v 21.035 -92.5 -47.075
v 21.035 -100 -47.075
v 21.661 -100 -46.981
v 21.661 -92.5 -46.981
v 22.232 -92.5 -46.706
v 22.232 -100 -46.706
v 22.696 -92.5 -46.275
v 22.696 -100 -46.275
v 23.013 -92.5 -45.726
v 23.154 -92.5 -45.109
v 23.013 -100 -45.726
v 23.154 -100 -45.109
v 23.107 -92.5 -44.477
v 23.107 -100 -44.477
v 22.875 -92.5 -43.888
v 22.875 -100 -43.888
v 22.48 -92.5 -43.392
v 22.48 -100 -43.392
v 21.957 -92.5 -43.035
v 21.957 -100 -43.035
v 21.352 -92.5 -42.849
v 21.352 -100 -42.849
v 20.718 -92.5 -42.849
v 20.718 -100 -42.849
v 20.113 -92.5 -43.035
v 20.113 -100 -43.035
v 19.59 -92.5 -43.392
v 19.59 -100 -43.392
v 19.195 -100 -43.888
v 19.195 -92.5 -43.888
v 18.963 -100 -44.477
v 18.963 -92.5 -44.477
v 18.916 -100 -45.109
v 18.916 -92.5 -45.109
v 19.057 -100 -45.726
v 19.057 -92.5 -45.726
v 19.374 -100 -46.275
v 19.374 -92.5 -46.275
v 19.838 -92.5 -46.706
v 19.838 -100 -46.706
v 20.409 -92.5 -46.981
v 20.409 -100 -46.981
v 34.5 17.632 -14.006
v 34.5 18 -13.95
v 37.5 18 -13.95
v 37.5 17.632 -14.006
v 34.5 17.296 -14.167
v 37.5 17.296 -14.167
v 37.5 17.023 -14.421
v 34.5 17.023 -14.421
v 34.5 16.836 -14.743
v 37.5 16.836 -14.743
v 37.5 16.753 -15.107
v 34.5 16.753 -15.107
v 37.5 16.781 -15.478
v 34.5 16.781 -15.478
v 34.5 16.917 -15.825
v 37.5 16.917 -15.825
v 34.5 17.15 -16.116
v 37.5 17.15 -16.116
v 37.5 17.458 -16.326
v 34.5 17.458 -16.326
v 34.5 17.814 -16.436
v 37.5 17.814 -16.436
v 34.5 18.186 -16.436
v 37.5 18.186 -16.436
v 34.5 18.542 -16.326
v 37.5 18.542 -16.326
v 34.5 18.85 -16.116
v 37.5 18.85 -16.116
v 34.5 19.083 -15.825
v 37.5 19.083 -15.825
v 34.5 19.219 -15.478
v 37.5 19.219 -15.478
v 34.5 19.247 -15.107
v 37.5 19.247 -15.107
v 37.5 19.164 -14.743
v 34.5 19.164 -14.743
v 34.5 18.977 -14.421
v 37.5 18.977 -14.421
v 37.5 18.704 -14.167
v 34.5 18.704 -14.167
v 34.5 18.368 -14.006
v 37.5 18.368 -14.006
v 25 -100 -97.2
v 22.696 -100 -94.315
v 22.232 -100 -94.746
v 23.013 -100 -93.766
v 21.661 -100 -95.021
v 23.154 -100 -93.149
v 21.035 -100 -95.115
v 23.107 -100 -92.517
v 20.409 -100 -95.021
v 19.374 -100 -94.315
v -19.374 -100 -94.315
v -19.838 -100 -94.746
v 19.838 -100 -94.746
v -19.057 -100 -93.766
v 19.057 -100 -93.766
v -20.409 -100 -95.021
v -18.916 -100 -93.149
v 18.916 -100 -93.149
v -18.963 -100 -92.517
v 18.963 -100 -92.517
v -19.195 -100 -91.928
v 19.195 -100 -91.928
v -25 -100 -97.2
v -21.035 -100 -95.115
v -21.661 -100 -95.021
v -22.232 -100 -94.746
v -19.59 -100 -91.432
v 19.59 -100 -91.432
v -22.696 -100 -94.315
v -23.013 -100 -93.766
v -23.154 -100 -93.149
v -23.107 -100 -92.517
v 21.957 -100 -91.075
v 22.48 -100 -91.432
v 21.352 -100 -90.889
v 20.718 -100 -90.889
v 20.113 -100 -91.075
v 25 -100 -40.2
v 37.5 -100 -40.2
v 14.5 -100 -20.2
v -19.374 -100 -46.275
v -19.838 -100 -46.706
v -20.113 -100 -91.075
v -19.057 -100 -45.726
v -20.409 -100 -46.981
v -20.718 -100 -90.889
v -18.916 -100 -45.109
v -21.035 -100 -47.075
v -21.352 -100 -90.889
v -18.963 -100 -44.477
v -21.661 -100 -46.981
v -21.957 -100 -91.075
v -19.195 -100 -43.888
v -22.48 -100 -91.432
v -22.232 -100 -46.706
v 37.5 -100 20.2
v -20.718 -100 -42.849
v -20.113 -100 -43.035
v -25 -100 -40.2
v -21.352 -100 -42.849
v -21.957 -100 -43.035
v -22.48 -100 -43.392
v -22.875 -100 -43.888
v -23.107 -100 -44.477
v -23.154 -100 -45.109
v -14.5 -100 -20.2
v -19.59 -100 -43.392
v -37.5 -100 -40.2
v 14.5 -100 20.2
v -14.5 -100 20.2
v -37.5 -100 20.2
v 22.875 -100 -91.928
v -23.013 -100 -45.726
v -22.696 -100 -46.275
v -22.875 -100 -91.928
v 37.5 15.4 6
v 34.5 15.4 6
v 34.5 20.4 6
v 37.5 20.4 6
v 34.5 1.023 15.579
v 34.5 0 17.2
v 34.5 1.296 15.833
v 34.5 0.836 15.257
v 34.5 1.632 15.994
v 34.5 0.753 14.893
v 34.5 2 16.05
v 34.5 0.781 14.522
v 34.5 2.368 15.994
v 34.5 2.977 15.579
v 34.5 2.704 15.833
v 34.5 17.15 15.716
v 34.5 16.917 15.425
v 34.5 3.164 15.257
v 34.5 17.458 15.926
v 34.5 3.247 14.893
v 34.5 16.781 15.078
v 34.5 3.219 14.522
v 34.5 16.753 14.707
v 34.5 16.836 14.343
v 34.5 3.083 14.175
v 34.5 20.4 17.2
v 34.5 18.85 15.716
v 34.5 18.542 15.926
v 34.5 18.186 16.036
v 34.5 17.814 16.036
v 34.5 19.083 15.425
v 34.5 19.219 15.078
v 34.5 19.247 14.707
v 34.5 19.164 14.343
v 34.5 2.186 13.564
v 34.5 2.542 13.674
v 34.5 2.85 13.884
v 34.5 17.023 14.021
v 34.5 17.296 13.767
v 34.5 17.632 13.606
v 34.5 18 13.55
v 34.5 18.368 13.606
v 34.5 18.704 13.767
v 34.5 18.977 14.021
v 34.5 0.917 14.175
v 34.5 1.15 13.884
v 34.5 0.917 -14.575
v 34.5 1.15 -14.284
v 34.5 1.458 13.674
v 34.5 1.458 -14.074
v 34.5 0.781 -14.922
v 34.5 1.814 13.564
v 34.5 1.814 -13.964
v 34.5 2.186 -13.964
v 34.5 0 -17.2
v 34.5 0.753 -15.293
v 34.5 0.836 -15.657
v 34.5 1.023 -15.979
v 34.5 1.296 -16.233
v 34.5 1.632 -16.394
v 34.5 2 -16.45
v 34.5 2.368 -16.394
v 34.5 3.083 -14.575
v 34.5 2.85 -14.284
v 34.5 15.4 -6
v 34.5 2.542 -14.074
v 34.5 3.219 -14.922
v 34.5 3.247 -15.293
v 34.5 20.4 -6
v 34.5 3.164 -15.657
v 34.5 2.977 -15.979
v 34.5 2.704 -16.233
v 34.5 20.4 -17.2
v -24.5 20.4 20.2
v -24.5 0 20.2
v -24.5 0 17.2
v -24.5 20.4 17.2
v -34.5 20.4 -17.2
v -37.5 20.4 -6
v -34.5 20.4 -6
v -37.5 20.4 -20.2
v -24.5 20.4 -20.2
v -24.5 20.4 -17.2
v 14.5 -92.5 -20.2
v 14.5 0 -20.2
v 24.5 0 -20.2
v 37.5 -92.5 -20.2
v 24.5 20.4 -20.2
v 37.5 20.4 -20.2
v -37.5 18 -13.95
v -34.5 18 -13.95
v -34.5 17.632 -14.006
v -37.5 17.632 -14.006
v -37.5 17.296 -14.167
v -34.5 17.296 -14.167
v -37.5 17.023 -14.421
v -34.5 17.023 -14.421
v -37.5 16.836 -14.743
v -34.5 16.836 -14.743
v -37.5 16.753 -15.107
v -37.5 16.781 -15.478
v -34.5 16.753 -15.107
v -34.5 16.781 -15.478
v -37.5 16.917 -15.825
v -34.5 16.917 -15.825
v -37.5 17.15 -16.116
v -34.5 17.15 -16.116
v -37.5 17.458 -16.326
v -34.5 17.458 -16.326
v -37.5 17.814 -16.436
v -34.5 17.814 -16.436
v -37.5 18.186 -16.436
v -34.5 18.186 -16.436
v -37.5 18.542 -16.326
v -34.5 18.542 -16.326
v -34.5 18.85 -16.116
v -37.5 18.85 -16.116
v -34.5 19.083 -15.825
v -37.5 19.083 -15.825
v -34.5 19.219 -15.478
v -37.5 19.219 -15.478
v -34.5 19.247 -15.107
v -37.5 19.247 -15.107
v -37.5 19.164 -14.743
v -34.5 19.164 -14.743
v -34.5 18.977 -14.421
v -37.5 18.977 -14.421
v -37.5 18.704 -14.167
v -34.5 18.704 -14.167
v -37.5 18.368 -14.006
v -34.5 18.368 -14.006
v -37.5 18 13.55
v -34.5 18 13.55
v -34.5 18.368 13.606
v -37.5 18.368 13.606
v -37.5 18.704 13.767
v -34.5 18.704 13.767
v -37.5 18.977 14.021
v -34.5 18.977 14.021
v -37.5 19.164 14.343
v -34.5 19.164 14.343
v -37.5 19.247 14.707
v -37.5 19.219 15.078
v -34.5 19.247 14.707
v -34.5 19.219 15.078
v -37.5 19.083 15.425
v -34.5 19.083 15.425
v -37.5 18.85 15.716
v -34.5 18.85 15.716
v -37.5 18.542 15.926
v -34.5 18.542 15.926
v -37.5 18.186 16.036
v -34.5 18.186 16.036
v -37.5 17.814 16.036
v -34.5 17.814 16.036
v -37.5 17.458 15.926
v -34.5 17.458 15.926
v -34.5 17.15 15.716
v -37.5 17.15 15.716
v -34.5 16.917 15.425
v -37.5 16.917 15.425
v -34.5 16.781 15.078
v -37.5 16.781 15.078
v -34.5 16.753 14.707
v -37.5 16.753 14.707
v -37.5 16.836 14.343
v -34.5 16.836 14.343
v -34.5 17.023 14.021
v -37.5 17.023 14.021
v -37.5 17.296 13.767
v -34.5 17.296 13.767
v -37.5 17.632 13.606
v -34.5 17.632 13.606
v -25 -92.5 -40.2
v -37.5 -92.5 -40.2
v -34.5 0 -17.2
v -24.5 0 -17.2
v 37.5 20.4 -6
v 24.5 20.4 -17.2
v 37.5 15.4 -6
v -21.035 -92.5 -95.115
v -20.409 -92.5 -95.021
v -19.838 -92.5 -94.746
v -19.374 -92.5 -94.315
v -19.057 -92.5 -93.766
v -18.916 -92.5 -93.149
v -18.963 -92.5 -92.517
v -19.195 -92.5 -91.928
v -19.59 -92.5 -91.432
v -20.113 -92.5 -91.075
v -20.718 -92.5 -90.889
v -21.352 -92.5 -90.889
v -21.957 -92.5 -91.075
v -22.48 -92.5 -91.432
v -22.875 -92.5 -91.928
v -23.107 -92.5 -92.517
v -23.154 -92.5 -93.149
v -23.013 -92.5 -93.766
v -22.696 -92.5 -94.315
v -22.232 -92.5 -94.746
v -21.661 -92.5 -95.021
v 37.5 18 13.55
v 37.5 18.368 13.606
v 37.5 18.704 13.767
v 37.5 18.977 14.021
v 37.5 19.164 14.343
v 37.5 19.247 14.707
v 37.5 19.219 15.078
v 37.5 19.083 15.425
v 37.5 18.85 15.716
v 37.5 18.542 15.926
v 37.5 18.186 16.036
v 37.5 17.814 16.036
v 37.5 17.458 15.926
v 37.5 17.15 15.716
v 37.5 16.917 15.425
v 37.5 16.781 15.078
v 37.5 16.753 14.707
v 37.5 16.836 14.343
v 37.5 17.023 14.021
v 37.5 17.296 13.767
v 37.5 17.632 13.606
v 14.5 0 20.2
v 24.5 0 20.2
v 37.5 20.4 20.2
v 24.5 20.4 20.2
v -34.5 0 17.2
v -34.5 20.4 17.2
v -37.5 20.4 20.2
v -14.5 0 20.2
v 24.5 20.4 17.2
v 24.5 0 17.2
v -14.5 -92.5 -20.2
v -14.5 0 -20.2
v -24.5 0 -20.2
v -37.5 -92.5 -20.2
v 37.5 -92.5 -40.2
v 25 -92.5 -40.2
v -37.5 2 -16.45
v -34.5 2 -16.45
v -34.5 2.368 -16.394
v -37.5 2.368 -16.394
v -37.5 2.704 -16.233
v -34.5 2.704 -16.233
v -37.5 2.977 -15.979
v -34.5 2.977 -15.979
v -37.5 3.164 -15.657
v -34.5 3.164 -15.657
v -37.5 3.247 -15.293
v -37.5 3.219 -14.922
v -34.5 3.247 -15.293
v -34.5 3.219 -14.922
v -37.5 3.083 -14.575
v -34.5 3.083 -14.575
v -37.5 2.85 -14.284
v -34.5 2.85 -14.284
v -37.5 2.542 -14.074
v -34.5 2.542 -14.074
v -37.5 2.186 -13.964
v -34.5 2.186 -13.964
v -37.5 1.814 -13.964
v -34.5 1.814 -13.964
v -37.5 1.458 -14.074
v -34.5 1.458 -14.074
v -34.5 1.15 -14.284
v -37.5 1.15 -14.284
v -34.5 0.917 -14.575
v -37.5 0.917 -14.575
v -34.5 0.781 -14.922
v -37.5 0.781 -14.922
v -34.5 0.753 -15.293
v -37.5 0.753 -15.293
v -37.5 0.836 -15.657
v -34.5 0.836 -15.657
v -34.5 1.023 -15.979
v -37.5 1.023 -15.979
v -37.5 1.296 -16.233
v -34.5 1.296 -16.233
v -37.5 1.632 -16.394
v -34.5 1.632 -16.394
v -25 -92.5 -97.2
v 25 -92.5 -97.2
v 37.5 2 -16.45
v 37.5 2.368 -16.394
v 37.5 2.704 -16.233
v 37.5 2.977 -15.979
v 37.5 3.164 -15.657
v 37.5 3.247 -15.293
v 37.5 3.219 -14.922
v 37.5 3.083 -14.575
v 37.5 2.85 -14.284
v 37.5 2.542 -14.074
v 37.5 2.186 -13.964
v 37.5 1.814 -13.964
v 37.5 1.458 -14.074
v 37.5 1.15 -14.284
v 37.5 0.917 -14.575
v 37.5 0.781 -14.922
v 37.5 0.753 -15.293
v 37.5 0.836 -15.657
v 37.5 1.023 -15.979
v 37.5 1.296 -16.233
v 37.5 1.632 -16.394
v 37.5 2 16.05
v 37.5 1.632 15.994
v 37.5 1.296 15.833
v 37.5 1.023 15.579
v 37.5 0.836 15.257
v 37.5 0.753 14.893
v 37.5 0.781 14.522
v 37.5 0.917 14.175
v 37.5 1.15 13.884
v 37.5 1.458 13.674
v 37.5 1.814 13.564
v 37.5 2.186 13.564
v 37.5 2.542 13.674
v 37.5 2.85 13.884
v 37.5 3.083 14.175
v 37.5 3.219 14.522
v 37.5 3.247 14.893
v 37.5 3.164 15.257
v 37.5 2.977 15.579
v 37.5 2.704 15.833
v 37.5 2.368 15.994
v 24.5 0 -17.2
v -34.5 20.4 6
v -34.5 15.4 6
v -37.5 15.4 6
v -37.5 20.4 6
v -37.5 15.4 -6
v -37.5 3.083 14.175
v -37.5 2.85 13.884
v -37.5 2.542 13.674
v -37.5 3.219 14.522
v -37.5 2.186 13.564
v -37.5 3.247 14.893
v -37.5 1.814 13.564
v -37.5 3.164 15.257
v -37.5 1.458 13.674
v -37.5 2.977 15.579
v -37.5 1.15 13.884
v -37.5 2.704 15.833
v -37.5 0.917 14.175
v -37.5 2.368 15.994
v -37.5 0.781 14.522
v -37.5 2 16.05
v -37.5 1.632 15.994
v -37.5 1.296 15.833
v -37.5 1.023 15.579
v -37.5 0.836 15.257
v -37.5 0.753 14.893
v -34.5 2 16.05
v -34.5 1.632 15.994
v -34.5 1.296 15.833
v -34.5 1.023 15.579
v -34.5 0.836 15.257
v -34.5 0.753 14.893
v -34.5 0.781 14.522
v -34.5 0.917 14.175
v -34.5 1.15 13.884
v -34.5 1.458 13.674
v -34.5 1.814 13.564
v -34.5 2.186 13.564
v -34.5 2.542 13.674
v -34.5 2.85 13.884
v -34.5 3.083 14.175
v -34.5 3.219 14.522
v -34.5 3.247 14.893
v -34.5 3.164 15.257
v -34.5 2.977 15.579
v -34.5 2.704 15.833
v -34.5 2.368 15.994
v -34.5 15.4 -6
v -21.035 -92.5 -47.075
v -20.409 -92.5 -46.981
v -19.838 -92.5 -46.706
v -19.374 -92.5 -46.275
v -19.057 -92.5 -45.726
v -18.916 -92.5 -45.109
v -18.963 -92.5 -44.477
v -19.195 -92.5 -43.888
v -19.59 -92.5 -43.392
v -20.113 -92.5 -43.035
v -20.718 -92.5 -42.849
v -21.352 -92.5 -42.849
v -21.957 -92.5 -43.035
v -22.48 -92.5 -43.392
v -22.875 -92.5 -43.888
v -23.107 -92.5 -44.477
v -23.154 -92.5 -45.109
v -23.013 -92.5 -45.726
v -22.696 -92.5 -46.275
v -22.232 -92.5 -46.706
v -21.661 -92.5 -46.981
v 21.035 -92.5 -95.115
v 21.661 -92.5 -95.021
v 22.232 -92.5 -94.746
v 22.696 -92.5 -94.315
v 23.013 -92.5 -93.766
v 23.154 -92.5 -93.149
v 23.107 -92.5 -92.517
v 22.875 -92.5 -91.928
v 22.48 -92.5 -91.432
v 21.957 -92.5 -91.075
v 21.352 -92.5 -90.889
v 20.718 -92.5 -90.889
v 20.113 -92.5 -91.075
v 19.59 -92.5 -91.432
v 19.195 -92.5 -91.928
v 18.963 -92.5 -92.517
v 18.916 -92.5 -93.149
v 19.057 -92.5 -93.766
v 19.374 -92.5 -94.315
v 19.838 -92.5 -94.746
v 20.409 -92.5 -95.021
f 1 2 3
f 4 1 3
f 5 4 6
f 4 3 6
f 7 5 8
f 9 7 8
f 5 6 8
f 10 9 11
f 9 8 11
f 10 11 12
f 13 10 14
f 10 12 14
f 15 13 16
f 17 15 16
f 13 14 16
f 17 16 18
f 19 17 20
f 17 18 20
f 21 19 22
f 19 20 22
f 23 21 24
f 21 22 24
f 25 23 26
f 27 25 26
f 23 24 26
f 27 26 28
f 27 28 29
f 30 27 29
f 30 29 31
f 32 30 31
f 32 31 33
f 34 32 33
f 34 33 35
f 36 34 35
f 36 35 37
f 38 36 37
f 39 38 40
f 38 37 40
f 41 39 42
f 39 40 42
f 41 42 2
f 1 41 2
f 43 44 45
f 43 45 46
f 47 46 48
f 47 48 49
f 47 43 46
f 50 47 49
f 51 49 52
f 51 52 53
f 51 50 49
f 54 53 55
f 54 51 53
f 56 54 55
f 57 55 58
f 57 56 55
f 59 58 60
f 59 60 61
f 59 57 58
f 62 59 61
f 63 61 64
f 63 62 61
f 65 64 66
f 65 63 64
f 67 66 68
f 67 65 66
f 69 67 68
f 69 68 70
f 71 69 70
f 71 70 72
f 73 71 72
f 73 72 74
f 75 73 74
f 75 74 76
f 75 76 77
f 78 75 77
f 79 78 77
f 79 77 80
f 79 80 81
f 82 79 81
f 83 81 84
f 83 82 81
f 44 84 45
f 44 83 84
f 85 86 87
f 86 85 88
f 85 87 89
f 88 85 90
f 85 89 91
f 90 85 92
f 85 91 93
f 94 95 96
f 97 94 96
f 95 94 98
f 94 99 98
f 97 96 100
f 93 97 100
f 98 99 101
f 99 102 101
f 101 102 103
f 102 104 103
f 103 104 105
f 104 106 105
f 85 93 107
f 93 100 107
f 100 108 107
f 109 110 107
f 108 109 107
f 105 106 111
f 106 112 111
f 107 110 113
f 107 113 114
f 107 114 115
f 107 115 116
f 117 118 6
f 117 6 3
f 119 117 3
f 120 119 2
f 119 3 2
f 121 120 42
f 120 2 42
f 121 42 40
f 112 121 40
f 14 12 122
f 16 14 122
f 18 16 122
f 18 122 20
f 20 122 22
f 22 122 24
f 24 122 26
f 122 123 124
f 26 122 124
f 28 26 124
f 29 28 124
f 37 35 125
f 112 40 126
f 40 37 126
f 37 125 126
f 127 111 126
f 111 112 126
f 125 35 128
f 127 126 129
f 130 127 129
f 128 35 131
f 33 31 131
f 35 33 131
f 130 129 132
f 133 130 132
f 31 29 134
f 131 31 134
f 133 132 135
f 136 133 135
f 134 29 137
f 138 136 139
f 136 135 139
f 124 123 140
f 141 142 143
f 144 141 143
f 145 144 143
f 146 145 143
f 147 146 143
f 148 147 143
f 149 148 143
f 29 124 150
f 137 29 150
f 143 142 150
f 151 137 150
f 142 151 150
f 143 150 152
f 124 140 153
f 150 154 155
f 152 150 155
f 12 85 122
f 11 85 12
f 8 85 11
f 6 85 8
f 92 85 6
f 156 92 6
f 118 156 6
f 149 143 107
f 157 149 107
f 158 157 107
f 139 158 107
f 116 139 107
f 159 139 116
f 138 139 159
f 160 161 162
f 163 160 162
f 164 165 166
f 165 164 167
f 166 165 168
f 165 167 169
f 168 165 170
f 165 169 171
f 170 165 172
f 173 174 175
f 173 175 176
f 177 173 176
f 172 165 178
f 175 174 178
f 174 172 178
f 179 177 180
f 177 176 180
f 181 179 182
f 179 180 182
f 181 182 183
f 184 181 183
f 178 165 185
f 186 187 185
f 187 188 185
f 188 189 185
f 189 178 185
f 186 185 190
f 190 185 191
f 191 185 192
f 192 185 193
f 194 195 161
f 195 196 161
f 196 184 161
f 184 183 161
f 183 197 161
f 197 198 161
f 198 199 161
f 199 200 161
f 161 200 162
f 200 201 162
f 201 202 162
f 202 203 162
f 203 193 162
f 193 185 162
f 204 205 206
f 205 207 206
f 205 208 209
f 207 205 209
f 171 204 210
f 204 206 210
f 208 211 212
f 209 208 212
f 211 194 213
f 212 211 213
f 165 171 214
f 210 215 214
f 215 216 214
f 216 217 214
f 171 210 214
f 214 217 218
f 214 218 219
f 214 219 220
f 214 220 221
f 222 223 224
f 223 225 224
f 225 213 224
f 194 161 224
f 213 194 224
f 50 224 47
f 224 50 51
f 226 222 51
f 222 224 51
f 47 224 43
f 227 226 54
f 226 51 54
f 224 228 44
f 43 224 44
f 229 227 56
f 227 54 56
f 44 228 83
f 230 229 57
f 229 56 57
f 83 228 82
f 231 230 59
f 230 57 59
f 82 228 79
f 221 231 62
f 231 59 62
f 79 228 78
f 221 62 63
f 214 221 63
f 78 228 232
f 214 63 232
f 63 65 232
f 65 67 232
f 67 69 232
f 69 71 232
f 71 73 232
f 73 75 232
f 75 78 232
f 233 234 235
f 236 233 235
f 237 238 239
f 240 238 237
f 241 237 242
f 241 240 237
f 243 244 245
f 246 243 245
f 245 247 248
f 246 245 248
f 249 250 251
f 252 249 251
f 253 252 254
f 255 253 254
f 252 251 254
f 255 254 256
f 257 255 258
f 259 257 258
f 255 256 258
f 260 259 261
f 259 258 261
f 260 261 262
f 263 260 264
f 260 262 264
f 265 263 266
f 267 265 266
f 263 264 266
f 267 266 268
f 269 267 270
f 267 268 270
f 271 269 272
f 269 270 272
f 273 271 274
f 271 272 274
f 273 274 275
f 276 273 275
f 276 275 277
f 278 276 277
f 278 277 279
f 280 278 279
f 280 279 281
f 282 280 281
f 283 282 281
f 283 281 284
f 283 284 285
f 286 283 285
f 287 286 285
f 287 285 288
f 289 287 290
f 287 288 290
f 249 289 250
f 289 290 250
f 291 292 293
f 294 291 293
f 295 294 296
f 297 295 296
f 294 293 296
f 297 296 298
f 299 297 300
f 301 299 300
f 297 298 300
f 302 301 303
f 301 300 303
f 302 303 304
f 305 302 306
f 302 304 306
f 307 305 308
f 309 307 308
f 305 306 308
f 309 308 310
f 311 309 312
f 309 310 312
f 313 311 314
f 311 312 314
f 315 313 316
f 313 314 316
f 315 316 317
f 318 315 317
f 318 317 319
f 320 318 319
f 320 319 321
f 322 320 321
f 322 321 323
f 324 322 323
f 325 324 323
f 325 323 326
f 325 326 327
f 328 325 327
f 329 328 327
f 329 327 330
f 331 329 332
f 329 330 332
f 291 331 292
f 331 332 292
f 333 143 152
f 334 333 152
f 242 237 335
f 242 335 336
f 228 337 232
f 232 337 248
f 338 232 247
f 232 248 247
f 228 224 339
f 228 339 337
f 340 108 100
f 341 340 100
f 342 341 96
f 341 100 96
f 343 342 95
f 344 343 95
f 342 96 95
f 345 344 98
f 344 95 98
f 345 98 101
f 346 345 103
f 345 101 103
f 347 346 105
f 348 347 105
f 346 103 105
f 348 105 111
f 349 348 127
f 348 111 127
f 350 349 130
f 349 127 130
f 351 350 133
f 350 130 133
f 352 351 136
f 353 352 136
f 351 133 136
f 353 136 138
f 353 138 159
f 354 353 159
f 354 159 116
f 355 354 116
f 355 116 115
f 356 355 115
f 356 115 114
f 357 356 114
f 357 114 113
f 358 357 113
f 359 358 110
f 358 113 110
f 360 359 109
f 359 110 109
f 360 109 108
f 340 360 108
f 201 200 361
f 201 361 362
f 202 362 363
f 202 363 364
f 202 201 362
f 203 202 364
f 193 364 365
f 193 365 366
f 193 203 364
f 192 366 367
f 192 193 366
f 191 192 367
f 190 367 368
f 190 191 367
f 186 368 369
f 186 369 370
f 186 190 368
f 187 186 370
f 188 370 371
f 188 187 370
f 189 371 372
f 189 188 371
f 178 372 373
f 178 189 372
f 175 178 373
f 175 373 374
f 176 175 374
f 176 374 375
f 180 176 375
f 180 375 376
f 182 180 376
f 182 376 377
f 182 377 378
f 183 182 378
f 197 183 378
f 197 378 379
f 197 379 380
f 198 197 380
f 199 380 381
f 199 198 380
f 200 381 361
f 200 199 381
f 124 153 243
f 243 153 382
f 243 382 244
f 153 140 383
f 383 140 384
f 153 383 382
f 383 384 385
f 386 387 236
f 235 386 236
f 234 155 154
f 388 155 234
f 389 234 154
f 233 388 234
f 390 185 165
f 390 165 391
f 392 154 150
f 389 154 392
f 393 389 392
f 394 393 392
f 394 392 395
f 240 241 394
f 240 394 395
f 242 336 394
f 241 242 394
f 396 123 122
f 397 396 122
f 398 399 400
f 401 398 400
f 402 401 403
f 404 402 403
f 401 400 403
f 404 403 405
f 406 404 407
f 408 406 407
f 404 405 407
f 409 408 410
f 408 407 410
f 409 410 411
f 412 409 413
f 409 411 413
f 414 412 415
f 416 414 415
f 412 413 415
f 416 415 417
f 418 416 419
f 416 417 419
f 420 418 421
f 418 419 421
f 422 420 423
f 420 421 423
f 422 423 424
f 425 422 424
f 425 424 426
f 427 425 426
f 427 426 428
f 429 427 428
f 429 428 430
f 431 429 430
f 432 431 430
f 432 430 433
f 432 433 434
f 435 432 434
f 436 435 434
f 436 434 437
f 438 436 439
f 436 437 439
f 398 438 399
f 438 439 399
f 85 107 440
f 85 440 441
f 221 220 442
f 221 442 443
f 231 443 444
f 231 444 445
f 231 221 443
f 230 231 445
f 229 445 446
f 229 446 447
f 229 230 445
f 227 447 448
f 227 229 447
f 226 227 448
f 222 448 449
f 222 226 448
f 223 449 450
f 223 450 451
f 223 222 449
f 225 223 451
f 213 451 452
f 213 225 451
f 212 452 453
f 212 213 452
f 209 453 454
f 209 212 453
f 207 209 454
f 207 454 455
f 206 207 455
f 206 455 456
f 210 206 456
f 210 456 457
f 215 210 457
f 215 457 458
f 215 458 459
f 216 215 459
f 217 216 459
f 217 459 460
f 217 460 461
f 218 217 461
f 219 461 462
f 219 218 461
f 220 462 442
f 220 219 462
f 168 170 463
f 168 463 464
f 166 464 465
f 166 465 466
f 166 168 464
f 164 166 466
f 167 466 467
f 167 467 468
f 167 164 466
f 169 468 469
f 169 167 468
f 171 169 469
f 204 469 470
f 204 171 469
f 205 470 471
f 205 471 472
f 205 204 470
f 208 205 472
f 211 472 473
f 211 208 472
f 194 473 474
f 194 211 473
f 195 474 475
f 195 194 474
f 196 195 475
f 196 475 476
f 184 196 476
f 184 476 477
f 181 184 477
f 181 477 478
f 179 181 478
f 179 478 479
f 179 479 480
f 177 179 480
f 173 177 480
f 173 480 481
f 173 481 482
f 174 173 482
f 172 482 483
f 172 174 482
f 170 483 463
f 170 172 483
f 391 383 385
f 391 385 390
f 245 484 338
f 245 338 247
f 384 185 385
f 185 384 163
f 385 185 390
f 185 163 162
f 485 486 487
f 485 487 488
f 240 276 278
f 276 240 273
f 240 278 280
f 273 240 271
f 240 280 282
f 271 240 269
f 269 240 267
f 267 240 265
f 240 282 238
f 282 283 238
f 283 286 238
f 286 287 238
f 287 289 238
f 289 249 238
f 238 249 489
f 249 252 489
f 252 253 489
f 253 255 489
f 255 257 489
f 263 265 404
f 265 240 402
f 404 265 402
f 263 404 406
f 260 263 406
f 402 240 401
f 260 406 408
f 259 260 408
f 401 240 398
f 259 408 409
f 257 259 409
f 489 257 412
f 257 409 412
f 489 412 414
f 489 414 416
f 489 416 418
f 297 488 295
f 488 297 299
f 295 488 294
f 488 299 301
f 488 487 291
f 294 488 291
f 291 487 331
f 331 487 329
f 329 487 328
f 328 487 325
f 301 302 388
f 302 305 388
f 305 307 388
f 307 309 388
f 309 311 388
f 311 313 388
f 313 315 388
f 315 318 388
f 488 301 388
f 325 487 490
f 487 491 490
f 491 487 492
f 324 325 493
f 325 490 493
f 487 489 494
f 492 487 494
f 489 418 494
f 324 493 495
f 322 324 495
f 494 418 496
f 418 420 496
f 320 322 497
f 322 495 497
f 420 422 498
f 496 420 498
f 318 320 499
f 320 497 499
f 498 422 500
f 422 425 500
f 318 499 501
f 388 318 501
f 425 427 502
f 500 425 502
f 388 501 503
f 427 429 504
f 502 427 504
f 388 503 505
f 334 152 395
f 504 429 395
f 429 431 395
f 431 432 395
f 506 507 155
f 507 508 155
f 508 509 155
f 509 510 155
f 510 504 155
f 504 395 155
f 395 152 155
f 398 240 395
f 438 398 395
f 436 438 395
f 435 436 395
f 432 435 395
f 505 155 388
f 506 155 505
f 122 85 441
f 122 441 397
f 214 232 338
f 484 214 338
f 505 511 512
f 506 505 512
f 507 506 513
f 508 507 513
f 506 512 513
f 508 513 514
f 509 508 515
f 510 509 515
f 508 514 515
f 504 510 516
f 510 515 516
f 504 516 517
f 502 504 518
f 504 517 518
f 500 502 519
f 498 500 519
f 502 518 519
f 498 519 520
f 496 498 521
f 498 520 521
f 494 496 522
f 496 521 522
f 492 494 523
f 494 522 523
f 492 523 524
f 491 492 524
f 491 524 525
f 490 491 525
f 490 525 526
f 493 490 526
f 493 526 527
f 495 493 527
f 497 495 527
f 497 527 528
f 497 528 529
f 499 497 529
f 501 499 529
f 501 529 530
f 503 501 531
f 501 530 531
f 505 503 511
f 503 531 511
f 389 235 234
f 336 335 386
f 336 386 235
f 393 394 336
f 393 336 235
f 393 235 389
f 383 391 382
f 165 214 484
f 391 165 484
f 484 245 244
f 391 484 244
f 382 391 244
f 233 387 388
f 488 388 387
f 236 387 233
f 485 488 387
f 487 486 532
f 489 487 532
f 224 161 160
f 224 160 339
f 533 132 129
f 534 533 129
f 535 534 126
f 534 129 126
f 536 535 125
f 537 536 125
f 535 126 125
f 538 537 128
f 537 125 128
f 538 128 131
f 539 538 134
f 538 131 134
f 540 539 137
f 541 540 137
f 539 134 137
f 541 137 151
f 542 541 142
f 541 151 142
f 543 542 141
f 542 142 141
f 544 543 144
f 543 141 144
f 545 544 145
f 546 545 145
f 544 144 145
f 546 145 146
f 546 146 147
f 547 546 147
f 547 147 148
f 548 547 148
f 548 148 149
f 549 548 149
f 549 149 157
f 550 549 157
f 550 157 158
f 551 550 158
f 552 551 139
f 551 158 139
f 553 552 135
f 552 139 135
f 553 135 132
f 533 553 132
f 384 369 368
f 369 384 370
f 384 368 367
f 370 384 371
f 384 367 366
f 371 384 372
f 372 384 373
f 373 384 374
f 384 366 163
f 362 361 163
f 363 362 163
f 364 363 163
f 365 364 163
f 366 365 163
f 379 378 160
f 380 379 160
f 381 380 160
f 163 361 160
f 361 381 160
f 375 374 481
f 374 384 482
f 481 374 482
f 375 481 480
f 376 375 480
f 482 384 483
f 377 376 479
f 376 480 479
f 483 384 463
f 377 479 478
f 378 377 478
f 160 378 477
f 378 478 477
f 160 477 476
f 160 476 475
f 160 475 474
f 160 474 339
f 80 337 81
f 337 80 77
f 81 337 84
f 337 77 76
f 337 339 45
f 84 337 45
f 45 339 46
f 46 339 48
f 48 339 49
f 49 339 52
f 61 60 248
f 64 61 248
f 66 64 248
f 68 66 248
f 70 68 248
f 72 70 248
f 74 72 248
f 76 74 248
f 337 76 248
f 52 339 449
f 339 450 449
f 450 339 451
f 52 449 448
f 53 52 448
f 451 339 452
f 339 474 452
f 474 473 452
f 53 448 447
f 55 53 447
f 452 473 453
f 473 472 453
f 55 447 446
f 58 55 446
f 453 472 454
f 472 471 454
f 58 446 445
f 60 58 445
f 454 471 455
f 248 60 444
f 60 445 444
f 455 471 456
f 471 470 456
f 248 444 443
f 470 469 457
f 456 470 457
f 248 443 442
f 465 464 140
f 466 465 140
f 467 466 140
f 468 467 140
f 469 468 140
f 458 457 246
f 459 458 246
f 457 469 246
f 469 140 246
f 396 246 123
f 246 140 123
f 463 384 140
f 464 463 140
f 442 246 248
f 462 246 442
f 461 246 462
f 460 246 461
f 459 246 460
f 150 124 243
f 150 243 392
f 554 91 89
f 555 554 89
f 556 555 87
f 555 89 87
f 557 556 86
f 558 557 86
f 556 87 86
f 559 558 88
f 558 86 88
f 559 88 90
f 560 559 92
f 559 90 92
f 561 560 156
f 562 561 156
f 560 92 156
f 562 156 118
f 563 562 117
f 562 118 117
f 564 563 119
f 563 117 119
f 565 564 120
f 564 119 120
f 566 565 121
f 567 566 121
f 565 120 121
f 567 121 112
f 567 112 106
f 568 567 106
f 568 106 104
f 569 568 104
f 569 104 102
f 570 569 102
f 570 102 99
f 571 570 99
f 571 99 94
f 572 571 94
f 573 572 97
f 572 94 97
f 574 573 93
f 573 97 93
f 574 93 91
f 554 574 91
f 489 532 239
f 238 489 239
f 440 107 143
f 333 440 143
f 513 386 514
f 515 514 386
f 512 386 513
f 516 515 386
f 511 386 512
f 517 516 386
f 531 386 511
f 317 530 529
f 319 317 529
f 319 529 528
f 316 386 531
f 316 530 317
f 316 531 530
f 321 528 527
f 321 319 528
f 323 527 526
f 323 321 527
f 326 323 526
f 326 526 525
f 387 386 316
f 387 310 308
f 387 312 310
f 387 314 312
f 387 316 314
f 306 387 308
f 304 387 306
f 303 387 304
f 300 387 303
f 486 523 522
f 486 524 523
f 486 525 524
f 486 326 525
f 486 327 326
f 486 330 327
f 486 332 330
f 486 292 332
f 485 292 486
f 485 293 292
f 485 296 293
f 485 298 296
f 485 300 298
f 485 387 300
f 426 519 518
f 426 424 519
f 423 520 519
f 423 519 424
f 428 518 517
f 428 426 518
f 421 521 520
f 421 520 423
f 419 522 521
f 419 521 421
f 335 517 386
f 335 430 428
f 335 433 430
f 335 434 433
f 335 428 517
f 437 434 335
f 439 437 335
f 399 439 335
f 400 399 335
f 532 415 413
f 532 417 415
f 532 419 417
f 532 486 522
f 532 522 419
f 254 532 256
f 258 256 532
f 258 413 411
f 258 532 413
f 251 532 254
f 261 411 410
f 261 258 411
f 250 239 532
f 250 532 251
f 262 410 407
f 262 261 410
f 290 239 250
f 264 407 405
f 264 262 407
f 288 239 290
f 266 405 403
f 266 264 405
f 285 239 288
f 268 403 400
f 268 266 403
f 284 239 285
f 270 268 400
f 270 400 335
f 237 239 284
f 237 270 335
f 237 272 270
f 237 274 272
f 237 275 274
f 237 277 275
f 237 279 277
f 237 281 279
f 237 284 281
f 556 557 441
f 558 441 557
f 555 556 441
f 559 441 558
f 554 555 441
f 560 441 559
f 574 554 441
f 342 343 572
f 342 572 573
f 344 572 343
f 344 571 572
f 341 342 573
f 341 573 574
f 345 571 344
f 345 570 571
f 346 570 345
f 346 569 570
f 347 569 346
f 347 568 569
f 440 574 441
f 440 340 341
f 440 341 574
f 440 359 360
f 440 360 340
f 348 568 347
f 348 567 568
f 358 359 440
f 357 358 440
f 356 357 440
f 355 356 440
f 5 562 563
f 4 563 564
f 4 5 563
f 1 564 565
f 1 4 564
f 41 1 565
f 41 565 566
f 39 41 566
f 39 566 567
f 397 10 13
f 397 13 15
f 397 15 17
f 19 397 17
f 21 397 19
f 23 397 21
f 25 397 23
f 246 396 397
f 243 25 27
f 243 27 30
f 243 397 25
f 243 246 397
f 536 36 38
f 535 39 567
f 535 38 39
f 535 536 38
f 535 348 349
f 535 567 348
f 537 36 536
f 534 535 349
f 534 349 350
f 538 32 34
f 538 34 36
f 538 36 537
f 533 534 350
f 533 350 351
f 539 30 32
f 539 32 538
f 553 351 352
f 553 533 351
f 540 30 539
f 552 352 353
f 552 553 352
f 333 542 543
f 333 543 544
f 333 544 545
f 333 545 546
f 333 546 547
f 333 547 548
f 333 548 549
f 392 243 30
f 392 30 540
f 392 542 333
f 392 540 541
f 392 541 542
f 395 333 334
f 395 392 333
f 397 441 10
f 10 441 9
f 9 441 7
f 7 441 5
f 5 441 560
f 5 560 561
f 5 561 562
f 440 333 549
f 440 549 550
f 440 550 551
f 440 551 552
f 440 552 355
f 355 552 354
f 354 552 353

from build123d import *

# Parameters (mm, degrees)
BOSS_EXTRUDE1_START = -34.5
SKETCH2_W           = 34.4
SKETCH2_H           = 20.4
SKETCH2_R           = 1.25
BOSS_EXTRUDE1_DEPTH = 3
SKETCH1_W           = 13
SKETCH1_H           = 3
BOSS_EXTRUDE2_DEPTH = 20.4
SKETCH1_3_W         = 20
SKETCH1_3_H         = 34.4
SKETCH1_3_W_2       = 10
SKETCH1_3_H_2       = 3
SKETCH1_3_W_3       = 3
BOSS_EXTRUDE3_DEPTH = 3
SKETCH1_4_W         = 3
SKETCH1_4_H         = 34.4
SKETCH1_4_W_2       = 10
SKETCH1_4_H_2       = 3
SKETCH1_4_W_3       = 20
BOSS_EXTRUDE4_DEPTH = 100
SKETCH4_W           = 12
SKETCH4_H           = 10
CUT_EXTRUDE1_DEPTH  = 132
SKETCH7_W           = 50
SKETCH7_H           = 57
SKETCH7_R           = 2.125
BOSS_EXTRUDE5_DEPTH = 7.5


with BuildPart() as part:
    # Sketch2 → Boss-Extrude1 (new body)
    with BuildSketch(Plane(origin=(0, 0, 0), x_dir=(0, 0, -1), z_dir=(1, 0, 0)).offset(BOSS_EXTRUDE1_START)):
        with Locations((0, 10.2)):
            Rectangle(SKETCH2_W, SKETCH2_H)
        with Locations((-14.8, 18)):
            Circle(SKETCH2_R, mode=Mode.SUBTRACT)
        with Locations(Location((-14.8, 2, 0), (0, 0, 180))):
            Circle(SKETCH2_R, mode=Mode.SUBTRACT)
        with Locations((15.2, 2)):
            Circle(SKETCH2_R, mode=Mode.SUBTRACT)
        with Locations(Location((15.2, 18, 0), (0, 0, 180))):
            Circle(SKETCH2_R, mode=Mode.SUBTRACT)
    extrude(amount=-BOSS_EXTRUDE1_DEPTH)

    # Sketch1 → Boss-Extrude2 (add)
    with BuildSketch(Plane(origin=(0, 0, 0), x_dir=(1, 0, 0), z_dir=(0, 1, 0))):
        with Locations((-31, -18.7)):
            Rectangle(SKETCH1_W, SKETCH1_H)
        with Locations((-31, 18.7)):
            Rectangle(SKETCH1_W, SKETCH1_H)
    extrude(amount=BOSS_EXTRUDE2_DEPTH)

    # Sketch1<3> → Boss-Extrude3 (add)
    with BuildSketch(Plane(origin=(0, 0, 0), x_dir=(1, 0, 0), z_dir=(0, 1, 0))):
        with Locations((-24.5, 0)):
            Rectangle(SKETCH1_3_W, SKETCH1_3_H)
        with Locations((-19.5, -18.7)):
            Rectangle(SKETCH1_3_W_2, SKETCH1_3_H_2)
        Polygon((-24.5, -20.2), (-24.5, -17.2), (-34.5, -17.2), (-37.5, -17.2), (-37.5, -20.2), align=None)
        with Locations((-36, 0)):
            Rectangle(SKETCH1_3_W_3, SKETCH1_3_H)
        Polygon((-34.5, 17.2), (-24.5, 17.2), (-24.5, 20.2), (-37.5, 20.2), (-37.5, 17.2), align=None)
        with Locations((-19.5, 18.7)):
            Rectangle(SKETCH1_3_W_2, SKETCH1_3_H_2)
    extrude(amount=-BOSS_EXTRUDE3_DEPTH)

    # Sketch1<4> → Boss-Extrude4 (add)
    with BuildSketch(Plane(origin=(0, 0, 0), x_dir=(1, 0, 0), z_dir=(0, 1, 0))):
        with Locations((-36, 0)):
            Rectangle(SKETCH1_4_W, SKETCH1_4_H)
        Polygon((-24.5, -20.2), (-24.5, -17.2), (-34.5, -17.2), (-37.5, -17.2), (-37.5, -20.2), align=None)
        with Locations((-19.5, -18.7)):
            Rectangle(SKETCH1_4_W_2, SKETCH1_4_H_2)
        with Locations((-24.5, 0)):
            Rectangle(SKETCH1_4_W_3, SKETCH1_4_H)
        Polygon((-34.5, 17.2), (-24.5, 17.2), (-24.5, 20.2), (-37.5, 20.2), (-37.5, 17.2), align=None)
        with Locations((-19.5, 18.7)):
            Rectangle(SKETCH1_4_W_2, SKETCH1_4_H_2)
    extrude(amount=-BOSS_EXTRUDE4_DEPTH)

    # Sketch4 → Cut-Extrude1 (cut)
    with BuildSketch(Plane(origin=(-34.5, 0, 0), x_dir=(0, 0, -1), z_dir=(1, 0, 0))):
        with Locations((0, 20.4)):
            Rectangle(SKETCH4_W, SKETCH4_H)
    extrude(amount=-CUT_EXTRUDE1_DEPTH, mode=Mode.SUBTRACT)


with BuildPart() as body_2:
    # Mirror6: mirrored copy
    add(part.part.mirror(Plane(origin=(0, 0, 0), x_dir=(0, 0, 1), z_dir=(1, 0, 0))))


with BuildPart() as part_1:
    add(part.part)

    add(body_2.part)  # Boss-Extrude5 merges body 2
    # Sketch7 → Boss-Extrude5 (add)
    # profile 1 of 2: a face of its own
    with BuildSketch(Plane.XZ.offset(100)):
        Polygon((-14.5, -20.2), (14.5, -20.2), (37.5, -20.2), (37.5, -40.2), (-37.5, -40.2), (-37.5, -20.2), align=None)
    # profile 2 of 2: a face of its own
    with BuildSketch(Plane.XZ.offset(100)):
        with Locations((0, -68.7)):
            Rectangle(SKETCH7_W, SKETCH7_H)
        with Locations(Location((-21.035, -92.99, 0), (0, 0, 270))):
            Circle(SKETCH7_R, mode=Mode.SUBTRACT)
        with Locations(Location((-21.035, -44.95, 0), (0, 0, 270))):
            Circle(SKETCH7_R, mode=Mode.SUBTRACT)
        with Locations(Location((21.035, -92.99, 0), (0, 0, 270))):
            Circle(SKETCH7_R, mode=Mode.SUBTRACT)
        with Locations(Location((21.035, -44.95, 0), (0, 0, 270))):
            Circle(SKETCH7_R, mode=Mode.SUBTRACT)
    extrude(amount=-BOSS_EXTRUDE5_DEPTH)


solid = part_1.part
